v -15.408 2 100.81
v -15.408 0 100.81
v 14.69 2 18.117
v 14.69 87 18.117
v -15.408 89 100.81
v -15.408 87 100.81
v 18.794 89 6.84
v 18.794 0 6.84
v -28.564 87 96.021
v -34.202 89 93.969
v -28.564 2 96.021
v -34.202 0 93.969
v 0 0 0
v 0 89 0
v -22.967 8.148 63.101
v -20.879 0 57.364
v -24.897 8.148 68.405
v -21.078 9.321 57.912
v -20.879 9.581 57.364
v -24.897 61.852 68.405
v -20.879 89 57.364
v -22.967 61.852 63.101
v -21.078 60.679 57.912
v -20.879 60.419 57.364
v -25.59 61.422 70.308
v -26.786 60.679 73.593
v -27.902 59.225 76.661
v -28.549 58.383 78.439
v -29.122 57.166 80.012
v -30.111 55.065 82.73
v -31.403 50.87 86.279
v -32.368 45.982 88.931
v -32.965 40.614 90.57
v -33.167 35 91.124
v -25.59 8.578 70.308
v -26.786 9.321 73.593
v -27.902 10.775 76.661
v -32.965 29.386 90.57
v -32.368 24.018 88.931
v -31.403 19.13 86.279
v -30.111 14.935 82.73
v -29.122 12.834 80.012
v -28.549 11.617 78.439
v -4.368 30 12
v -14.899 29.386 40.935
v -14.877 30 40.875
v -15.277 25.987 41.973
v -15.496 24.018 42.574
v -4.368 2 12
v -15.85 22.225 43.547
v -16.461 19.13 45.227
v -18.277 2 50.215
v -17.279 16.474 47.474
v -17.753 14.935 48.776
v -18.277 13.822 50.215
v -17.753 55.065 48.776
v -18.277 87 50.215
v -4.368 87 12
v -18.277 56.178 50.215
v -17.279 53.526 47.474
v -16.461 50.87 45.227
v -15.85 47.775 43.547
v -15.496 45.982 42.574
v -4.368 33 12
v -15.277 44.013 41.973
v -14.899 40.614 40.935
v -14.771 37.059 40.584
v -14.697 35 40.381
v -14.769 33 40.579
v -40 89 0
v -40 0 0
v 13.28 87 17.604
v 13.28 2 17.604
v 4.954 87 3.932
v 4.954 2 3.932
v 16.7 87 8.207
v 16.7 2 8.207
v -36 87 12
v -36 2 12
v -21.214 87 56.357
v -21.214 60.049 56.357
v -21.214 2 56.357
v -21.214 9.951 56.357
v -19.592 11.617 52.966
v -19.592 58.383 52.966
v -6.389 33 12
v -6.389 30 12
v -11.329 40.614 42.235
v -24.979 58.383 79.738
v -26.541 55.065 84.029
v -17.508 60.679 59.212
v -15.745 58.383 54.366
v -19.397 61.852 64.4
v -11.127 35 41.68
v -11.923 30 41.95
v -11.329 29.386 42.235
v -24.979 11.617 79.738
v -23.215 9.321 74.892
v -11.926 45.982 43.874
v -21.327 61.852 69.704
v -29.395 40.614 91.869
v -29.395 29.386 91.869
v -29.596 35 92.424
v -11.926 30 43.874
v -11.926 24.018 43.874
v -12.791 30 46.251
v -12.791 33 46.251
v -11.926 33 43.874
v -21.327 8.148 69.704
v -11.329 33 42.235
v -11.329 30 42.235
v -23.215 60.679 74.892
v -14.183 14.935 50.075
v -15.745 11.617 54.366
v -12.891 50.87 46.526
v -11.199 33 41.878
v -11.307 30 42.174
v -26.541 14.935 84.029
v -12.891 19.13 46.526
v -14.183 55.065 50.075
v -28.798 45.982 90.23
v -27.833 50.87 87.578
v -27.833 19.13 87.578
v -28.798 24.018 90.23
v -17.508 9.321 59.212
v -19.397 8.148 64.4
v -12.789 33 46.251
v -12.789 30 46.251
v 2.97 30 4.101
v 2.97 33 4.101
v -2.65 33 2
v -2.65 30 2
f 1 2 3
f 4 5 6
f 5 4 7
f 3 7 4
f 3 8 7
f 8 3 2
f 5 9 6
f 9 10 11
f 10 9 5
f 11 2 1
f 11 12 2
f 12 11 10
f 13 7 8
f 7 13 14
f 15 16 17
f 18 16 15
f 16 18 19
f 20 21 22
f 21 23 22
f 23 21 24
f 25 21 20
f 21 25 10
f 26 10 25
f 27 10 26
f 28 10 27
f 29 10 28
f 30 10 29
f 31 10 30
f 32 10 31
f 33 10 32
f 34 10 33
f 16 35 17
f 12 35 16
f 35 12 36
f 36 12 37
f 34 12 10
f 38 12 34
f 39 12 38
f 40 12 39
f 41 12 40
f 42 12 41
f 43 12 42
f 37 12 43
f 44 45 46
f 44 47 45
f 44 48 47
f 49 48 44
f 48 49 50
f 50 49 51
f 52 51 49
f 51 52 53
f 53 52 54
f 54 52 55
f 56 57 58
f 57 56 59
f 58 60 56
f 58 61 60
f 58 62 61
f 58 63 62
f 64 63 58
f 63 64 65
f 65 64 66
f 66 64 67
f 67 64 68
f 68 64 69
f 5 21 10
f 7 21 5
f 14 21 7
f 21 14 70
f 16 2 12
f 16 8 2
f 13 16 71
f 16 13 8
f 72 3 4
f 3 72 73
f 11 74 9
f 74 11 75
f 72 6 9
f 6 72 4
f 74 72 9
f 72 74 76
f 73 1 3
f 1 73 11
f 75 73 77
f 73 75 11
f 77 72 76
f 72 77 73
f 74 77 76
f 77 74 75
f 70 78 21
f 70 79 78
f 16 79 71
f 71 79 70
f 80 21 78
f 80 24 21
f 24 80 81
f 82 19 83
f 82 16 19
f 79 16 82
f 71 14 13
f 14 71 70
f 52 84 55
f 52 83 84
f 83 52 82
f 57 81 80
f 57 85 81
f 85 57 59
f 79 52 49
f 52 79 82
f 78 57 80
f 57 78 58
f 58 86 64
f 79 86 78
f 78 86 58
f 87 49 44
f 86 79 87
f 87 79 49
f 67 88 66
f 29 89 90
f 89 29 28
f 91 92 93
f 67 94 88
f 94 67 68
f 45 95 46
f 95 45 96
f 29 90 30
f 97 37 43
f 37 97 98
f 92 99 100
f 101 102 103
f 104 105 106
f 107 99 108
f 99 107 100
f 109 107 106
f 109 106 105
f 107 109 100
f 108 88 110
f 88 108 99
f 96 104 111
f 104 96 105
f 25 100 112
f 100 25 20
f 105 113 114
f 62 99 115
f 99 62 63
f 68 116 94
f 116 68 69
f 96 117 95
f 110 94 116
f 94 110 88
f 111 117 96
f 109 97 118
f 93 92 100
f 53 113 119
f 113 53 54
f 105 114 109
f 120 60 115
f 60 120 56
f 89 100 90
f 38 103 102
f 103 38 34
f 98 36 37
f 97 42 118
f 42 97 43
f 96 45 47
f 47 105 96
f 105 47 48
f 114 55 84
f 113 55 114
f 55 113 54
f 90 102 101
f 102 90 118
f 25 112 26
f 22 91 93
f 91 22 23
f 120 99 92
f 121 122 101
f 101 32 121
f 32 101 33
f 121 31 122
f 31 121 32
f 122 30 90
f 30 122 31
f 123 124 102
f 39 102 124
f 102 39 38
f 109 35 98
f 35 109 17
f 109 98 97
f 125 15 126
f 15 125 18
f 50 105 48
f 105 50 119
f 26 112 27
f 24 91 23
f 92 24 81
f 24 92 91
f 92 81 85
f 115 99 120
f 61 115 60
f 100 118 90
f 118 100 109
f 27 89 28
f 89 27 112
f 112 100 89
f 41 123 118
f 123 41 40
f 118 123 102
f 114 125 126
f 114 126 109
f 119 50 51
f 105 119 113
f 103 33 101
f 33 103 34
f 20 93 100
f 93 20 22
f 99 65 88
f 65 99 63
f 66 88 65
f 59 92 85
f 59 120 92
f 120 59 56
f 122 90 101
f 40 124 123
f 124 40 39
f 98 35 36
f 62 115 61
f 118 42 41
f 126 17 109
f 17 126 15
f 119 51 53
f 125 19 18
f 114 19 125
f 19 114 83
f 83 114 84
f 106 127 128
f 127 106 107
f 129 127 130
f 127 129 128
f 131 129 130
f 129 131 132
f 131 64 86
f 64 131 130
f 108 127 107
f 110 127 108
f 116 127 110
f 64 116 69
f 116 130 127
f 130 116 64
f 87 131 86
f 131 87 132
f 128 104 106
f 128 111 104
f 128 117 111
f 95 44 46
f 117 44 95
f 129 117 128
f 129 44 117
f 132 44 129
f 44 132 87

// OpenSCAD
module top(){
    rotate([0,-20,0]){
        difference(){
            cube([20,89,100]);
            translate([6,2,12]){  //move top hole
                color([1,0,0]) cube([14.5,85,100]);//top hole
            }
            translate([6,2,2]){
                cube([12.5,85,11]);//botton hole
            }
        }
    }
}

module base_shell(){
    	    polyhedron (	
	    		points = [[-20, 0, 60], [-20, 89, 60], [0, 89, 0], [0, 0, 0], [-40, 0, 0], [-40, 89, 0]],
			faces = [[0,3,2], [0,2,1], [3,0,4], [1,2,5], [0,5,4], [0,1,5],  [5,2,4], [4,2,3], ]);
}
module base_hole(){
    	    polyhedron (	
	    		points = [[-122, 2, 58], [-122, 87, 58], [-100, 87, 12], [-100, 2, 12], [-140, 2, 12], [-140, 87, 12]],
			faces = [[0,3,2], [0,2,1], [3,0,4], [1,2,5], [0,5,4], [0,1,5],  [5,2,4], [4,2,3], ]);
}

module base(){
    difference(){
    base_shell();
        translate([100,0,0]){
            base_hole();  
        }
    }
}

module hole(){
     translate([-26,35,65]) rotate([0,70,0]){
        cylinder(h=6,r1=27,r2=27);
    }
}
module channel(){
    translate([-2.65,30,2])rotate([0,-20.5,0]){
        cube([6,3,45]);
    }
}

difference(){
union(){
    top();
    base();
}
hole();
channel();
}
